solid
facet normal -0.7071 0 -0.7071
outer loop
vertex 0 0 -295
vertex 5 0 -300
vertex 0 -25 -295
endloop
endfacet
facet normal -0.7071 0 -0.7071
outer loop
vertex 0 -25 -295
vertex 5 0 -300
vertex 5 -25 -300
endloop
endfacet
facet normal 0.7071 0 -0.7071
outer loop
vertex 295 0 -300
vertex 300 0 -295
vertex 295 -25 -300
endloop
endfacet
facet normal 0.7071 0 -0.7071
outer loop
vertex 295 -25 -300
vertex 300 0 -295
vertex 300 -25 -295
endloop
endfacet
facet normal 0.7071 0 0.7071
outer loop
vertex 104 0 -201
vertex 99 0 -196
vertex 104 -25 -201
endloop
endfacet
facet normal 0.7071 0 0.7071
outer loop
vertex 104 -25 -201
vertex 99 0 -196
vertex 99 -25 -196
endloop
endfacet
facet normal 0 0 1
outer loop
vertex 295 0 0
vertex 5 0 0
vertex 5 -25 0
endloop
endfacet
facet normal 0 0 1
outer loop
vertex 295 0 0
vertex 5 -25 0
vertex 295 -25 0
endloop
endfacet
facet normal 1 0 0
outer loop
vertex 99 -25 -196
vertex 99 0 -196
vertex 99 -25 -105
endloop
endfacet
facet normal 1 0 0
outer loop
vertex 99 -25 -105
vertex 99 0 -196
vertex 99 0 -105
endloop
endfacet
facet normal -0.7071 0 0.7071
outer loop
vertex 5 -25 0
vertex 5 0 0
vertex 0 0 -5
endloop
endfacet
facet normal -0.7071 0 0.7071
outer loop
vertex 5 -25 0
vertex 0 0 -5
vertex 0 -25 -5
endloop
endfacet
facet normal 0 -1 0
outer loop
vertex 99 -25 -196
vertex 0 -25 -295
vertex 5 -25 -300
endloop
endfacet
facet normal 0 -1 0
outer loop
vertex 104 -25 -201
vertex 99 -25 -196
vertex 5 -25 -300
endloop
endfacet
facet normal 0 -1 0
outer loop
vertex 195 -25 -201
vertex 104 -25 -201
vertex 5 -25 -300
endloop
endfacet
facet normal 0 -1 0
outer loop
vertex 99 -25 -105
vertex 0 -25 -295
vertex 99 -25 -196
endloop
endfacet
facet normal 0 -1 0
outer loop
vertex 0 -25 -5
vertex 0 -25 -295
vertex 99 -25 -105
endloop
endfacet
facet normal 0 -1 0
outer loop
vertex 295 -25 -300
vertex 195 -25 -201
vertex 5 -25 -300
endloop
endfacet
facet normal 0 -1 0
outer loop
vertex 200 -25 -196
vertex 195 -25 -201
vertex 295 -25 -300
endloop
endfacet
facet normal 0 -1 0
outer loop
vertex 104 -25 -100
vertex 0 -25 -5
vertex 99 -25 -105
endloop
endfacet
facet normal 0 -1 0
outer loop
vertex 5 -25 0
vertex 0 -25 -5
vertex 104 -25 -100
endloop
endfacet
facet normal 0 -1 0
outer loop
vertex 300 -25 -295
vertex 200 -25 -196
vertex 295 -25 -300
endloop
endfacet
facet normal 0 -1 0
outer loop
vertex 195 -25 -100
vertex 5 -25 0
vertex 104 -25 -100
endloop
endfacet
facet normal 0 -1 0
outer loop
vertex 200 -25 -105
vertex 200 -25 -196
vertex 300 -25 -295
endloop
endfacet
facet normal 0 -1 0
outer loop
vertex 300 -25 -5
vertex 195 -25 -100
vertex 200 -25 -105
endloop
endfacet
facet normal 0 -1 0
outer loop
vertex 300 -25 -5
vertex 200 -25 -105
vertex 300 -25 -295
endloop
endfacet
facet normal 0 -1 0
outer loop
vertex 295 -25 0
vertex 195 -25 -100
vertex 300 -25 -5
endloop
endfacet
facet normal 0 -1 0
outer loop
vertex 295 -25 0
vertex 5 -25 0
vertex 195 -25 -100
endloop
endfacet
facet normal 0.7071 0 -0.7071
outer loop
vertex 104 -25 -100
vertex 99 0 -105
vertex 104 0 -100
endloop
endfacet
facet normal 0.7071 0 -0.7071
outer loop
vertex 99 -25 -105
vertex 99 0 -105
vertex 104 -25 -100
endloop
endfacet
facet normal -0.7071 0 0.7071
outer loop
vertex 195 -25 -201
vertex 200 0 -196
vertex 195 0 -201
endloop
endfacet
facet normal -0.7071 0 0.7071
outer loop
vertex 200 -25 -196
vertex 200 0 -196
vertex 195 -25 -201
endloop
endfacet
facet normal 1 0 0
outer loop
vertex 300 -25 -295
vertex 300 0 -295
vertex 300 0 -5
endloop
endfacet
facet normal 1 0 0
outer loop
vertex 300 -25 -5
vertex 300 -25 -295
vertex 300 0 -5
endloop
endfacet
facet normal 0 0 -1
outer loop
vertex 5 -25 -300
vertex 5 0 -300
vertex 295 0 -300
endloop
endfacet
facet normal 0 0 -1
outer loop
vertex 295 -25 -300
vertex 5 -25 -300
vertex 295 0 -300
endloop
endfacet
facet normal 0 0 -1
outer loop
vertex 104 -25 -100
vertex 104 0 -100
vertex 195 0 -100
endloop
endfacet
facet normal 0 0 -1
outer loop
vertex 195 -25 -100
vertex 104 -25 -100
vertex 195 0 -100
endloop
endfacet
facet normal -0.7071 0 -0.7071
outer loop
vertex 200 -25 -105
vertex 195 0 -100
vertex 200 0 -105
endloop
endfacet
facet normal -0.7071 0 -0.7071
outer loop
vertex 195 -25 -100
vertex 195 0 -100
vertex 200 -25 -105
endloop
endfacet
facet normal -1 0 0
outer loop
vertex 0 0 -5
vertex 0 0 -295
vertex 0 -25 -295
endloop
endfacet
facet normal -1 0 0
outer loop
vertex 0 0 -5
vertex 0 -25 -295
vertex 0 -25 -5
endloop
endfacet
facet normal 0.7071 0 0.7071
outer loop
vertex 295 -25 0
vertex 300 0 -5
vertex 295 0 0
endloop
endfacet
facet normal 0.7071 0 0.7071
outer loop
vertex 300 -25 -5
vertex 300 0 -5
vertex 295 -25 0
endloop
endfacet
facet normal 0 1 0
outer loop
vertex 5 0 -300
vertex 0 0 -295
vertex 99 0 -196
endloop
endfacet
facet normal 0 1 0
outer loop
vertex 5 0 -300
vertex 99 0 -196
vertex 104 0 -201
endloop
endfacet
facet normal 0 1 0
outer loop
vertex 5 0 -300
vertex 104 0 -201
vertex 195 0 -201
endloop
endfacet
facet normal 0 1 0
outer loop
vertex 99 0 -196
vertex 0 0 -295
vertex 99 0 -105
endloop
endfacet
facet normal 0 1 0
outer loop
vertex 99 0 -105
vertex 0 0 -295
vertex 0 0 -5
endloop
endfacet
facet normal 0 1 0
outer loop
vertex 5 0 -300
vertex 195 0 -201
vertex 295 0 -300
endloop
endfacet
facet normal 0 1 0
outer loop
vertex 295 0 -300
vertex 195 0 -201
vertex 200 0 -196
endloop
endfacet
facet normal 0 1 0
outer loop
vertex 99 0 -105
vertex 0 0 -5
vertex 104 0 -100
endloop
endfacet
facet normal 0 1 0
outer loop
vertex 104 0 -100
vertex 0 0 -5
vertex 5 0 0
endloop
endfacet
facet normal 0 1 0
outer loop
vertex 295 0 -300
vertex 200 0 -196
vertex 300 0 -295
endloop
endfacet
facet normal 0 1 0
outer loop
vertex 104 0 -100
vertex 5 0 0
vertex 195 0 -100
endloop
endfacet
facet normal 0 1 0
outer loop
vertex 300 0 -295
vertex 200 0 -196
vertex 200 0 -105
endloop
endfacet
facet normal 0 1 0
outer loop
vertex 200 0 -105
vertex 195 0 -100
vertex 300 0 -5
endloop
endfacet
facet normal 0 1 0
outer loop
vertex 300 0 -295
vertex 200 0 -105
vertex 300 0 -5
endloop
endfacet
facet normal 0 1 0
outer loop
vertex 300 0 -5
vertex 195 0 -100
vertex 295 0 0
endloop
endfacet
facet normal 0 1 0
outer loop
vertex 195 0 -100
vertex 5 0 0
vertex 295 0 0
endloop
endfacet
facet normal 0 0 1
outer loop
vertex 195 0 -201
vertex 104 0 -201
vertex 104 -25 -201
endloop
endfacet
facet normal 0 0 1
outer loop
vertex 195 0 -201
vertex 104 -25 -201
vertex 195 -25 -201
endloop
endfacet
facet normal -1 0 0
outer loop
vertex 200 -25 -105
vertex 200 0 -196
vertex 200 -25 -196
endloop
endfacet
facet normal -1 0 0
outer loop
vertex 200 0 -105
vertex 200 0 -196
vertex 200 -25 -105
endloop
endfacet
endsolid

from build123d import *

# Parameters (mm, degrees)
F0_W     = 300
F0_H     = 300
F0_W_2   = 101
F0_H_2   = 101
F1_DEPTH = 25
F2_SIZE  = 5


with BuildPart() as f1:
    # F0 (on Front) → F1 (new body)
    with BuildSketch(Plane.XZ):
        with Locations((150, -150)):
            Rectangle(F0_W, F0_H)
        with Locations((149.5, -150.5)):
            Rectangle(F0_W_2, F0_H_2, mode=Mode.SUBTRACT)
    extrude(amount=F1_DEPTH)

    # F2
    f2_edges = [f1.edges().sort_by_distance(p)[0] for p in [
        (0, -12.5, -300),
        (300, -12.5, -300),
        (300, -12.5, 0),
        (0, -12.5, 0),
        (200, -12.5, -201),
        (200, -12.5, -100),
        (99, -12.5, -100),
        (99, -12.5, -201),
    ]]
    chamfer(f2_edges, length=F2_SIZE)


solid = f1.part
